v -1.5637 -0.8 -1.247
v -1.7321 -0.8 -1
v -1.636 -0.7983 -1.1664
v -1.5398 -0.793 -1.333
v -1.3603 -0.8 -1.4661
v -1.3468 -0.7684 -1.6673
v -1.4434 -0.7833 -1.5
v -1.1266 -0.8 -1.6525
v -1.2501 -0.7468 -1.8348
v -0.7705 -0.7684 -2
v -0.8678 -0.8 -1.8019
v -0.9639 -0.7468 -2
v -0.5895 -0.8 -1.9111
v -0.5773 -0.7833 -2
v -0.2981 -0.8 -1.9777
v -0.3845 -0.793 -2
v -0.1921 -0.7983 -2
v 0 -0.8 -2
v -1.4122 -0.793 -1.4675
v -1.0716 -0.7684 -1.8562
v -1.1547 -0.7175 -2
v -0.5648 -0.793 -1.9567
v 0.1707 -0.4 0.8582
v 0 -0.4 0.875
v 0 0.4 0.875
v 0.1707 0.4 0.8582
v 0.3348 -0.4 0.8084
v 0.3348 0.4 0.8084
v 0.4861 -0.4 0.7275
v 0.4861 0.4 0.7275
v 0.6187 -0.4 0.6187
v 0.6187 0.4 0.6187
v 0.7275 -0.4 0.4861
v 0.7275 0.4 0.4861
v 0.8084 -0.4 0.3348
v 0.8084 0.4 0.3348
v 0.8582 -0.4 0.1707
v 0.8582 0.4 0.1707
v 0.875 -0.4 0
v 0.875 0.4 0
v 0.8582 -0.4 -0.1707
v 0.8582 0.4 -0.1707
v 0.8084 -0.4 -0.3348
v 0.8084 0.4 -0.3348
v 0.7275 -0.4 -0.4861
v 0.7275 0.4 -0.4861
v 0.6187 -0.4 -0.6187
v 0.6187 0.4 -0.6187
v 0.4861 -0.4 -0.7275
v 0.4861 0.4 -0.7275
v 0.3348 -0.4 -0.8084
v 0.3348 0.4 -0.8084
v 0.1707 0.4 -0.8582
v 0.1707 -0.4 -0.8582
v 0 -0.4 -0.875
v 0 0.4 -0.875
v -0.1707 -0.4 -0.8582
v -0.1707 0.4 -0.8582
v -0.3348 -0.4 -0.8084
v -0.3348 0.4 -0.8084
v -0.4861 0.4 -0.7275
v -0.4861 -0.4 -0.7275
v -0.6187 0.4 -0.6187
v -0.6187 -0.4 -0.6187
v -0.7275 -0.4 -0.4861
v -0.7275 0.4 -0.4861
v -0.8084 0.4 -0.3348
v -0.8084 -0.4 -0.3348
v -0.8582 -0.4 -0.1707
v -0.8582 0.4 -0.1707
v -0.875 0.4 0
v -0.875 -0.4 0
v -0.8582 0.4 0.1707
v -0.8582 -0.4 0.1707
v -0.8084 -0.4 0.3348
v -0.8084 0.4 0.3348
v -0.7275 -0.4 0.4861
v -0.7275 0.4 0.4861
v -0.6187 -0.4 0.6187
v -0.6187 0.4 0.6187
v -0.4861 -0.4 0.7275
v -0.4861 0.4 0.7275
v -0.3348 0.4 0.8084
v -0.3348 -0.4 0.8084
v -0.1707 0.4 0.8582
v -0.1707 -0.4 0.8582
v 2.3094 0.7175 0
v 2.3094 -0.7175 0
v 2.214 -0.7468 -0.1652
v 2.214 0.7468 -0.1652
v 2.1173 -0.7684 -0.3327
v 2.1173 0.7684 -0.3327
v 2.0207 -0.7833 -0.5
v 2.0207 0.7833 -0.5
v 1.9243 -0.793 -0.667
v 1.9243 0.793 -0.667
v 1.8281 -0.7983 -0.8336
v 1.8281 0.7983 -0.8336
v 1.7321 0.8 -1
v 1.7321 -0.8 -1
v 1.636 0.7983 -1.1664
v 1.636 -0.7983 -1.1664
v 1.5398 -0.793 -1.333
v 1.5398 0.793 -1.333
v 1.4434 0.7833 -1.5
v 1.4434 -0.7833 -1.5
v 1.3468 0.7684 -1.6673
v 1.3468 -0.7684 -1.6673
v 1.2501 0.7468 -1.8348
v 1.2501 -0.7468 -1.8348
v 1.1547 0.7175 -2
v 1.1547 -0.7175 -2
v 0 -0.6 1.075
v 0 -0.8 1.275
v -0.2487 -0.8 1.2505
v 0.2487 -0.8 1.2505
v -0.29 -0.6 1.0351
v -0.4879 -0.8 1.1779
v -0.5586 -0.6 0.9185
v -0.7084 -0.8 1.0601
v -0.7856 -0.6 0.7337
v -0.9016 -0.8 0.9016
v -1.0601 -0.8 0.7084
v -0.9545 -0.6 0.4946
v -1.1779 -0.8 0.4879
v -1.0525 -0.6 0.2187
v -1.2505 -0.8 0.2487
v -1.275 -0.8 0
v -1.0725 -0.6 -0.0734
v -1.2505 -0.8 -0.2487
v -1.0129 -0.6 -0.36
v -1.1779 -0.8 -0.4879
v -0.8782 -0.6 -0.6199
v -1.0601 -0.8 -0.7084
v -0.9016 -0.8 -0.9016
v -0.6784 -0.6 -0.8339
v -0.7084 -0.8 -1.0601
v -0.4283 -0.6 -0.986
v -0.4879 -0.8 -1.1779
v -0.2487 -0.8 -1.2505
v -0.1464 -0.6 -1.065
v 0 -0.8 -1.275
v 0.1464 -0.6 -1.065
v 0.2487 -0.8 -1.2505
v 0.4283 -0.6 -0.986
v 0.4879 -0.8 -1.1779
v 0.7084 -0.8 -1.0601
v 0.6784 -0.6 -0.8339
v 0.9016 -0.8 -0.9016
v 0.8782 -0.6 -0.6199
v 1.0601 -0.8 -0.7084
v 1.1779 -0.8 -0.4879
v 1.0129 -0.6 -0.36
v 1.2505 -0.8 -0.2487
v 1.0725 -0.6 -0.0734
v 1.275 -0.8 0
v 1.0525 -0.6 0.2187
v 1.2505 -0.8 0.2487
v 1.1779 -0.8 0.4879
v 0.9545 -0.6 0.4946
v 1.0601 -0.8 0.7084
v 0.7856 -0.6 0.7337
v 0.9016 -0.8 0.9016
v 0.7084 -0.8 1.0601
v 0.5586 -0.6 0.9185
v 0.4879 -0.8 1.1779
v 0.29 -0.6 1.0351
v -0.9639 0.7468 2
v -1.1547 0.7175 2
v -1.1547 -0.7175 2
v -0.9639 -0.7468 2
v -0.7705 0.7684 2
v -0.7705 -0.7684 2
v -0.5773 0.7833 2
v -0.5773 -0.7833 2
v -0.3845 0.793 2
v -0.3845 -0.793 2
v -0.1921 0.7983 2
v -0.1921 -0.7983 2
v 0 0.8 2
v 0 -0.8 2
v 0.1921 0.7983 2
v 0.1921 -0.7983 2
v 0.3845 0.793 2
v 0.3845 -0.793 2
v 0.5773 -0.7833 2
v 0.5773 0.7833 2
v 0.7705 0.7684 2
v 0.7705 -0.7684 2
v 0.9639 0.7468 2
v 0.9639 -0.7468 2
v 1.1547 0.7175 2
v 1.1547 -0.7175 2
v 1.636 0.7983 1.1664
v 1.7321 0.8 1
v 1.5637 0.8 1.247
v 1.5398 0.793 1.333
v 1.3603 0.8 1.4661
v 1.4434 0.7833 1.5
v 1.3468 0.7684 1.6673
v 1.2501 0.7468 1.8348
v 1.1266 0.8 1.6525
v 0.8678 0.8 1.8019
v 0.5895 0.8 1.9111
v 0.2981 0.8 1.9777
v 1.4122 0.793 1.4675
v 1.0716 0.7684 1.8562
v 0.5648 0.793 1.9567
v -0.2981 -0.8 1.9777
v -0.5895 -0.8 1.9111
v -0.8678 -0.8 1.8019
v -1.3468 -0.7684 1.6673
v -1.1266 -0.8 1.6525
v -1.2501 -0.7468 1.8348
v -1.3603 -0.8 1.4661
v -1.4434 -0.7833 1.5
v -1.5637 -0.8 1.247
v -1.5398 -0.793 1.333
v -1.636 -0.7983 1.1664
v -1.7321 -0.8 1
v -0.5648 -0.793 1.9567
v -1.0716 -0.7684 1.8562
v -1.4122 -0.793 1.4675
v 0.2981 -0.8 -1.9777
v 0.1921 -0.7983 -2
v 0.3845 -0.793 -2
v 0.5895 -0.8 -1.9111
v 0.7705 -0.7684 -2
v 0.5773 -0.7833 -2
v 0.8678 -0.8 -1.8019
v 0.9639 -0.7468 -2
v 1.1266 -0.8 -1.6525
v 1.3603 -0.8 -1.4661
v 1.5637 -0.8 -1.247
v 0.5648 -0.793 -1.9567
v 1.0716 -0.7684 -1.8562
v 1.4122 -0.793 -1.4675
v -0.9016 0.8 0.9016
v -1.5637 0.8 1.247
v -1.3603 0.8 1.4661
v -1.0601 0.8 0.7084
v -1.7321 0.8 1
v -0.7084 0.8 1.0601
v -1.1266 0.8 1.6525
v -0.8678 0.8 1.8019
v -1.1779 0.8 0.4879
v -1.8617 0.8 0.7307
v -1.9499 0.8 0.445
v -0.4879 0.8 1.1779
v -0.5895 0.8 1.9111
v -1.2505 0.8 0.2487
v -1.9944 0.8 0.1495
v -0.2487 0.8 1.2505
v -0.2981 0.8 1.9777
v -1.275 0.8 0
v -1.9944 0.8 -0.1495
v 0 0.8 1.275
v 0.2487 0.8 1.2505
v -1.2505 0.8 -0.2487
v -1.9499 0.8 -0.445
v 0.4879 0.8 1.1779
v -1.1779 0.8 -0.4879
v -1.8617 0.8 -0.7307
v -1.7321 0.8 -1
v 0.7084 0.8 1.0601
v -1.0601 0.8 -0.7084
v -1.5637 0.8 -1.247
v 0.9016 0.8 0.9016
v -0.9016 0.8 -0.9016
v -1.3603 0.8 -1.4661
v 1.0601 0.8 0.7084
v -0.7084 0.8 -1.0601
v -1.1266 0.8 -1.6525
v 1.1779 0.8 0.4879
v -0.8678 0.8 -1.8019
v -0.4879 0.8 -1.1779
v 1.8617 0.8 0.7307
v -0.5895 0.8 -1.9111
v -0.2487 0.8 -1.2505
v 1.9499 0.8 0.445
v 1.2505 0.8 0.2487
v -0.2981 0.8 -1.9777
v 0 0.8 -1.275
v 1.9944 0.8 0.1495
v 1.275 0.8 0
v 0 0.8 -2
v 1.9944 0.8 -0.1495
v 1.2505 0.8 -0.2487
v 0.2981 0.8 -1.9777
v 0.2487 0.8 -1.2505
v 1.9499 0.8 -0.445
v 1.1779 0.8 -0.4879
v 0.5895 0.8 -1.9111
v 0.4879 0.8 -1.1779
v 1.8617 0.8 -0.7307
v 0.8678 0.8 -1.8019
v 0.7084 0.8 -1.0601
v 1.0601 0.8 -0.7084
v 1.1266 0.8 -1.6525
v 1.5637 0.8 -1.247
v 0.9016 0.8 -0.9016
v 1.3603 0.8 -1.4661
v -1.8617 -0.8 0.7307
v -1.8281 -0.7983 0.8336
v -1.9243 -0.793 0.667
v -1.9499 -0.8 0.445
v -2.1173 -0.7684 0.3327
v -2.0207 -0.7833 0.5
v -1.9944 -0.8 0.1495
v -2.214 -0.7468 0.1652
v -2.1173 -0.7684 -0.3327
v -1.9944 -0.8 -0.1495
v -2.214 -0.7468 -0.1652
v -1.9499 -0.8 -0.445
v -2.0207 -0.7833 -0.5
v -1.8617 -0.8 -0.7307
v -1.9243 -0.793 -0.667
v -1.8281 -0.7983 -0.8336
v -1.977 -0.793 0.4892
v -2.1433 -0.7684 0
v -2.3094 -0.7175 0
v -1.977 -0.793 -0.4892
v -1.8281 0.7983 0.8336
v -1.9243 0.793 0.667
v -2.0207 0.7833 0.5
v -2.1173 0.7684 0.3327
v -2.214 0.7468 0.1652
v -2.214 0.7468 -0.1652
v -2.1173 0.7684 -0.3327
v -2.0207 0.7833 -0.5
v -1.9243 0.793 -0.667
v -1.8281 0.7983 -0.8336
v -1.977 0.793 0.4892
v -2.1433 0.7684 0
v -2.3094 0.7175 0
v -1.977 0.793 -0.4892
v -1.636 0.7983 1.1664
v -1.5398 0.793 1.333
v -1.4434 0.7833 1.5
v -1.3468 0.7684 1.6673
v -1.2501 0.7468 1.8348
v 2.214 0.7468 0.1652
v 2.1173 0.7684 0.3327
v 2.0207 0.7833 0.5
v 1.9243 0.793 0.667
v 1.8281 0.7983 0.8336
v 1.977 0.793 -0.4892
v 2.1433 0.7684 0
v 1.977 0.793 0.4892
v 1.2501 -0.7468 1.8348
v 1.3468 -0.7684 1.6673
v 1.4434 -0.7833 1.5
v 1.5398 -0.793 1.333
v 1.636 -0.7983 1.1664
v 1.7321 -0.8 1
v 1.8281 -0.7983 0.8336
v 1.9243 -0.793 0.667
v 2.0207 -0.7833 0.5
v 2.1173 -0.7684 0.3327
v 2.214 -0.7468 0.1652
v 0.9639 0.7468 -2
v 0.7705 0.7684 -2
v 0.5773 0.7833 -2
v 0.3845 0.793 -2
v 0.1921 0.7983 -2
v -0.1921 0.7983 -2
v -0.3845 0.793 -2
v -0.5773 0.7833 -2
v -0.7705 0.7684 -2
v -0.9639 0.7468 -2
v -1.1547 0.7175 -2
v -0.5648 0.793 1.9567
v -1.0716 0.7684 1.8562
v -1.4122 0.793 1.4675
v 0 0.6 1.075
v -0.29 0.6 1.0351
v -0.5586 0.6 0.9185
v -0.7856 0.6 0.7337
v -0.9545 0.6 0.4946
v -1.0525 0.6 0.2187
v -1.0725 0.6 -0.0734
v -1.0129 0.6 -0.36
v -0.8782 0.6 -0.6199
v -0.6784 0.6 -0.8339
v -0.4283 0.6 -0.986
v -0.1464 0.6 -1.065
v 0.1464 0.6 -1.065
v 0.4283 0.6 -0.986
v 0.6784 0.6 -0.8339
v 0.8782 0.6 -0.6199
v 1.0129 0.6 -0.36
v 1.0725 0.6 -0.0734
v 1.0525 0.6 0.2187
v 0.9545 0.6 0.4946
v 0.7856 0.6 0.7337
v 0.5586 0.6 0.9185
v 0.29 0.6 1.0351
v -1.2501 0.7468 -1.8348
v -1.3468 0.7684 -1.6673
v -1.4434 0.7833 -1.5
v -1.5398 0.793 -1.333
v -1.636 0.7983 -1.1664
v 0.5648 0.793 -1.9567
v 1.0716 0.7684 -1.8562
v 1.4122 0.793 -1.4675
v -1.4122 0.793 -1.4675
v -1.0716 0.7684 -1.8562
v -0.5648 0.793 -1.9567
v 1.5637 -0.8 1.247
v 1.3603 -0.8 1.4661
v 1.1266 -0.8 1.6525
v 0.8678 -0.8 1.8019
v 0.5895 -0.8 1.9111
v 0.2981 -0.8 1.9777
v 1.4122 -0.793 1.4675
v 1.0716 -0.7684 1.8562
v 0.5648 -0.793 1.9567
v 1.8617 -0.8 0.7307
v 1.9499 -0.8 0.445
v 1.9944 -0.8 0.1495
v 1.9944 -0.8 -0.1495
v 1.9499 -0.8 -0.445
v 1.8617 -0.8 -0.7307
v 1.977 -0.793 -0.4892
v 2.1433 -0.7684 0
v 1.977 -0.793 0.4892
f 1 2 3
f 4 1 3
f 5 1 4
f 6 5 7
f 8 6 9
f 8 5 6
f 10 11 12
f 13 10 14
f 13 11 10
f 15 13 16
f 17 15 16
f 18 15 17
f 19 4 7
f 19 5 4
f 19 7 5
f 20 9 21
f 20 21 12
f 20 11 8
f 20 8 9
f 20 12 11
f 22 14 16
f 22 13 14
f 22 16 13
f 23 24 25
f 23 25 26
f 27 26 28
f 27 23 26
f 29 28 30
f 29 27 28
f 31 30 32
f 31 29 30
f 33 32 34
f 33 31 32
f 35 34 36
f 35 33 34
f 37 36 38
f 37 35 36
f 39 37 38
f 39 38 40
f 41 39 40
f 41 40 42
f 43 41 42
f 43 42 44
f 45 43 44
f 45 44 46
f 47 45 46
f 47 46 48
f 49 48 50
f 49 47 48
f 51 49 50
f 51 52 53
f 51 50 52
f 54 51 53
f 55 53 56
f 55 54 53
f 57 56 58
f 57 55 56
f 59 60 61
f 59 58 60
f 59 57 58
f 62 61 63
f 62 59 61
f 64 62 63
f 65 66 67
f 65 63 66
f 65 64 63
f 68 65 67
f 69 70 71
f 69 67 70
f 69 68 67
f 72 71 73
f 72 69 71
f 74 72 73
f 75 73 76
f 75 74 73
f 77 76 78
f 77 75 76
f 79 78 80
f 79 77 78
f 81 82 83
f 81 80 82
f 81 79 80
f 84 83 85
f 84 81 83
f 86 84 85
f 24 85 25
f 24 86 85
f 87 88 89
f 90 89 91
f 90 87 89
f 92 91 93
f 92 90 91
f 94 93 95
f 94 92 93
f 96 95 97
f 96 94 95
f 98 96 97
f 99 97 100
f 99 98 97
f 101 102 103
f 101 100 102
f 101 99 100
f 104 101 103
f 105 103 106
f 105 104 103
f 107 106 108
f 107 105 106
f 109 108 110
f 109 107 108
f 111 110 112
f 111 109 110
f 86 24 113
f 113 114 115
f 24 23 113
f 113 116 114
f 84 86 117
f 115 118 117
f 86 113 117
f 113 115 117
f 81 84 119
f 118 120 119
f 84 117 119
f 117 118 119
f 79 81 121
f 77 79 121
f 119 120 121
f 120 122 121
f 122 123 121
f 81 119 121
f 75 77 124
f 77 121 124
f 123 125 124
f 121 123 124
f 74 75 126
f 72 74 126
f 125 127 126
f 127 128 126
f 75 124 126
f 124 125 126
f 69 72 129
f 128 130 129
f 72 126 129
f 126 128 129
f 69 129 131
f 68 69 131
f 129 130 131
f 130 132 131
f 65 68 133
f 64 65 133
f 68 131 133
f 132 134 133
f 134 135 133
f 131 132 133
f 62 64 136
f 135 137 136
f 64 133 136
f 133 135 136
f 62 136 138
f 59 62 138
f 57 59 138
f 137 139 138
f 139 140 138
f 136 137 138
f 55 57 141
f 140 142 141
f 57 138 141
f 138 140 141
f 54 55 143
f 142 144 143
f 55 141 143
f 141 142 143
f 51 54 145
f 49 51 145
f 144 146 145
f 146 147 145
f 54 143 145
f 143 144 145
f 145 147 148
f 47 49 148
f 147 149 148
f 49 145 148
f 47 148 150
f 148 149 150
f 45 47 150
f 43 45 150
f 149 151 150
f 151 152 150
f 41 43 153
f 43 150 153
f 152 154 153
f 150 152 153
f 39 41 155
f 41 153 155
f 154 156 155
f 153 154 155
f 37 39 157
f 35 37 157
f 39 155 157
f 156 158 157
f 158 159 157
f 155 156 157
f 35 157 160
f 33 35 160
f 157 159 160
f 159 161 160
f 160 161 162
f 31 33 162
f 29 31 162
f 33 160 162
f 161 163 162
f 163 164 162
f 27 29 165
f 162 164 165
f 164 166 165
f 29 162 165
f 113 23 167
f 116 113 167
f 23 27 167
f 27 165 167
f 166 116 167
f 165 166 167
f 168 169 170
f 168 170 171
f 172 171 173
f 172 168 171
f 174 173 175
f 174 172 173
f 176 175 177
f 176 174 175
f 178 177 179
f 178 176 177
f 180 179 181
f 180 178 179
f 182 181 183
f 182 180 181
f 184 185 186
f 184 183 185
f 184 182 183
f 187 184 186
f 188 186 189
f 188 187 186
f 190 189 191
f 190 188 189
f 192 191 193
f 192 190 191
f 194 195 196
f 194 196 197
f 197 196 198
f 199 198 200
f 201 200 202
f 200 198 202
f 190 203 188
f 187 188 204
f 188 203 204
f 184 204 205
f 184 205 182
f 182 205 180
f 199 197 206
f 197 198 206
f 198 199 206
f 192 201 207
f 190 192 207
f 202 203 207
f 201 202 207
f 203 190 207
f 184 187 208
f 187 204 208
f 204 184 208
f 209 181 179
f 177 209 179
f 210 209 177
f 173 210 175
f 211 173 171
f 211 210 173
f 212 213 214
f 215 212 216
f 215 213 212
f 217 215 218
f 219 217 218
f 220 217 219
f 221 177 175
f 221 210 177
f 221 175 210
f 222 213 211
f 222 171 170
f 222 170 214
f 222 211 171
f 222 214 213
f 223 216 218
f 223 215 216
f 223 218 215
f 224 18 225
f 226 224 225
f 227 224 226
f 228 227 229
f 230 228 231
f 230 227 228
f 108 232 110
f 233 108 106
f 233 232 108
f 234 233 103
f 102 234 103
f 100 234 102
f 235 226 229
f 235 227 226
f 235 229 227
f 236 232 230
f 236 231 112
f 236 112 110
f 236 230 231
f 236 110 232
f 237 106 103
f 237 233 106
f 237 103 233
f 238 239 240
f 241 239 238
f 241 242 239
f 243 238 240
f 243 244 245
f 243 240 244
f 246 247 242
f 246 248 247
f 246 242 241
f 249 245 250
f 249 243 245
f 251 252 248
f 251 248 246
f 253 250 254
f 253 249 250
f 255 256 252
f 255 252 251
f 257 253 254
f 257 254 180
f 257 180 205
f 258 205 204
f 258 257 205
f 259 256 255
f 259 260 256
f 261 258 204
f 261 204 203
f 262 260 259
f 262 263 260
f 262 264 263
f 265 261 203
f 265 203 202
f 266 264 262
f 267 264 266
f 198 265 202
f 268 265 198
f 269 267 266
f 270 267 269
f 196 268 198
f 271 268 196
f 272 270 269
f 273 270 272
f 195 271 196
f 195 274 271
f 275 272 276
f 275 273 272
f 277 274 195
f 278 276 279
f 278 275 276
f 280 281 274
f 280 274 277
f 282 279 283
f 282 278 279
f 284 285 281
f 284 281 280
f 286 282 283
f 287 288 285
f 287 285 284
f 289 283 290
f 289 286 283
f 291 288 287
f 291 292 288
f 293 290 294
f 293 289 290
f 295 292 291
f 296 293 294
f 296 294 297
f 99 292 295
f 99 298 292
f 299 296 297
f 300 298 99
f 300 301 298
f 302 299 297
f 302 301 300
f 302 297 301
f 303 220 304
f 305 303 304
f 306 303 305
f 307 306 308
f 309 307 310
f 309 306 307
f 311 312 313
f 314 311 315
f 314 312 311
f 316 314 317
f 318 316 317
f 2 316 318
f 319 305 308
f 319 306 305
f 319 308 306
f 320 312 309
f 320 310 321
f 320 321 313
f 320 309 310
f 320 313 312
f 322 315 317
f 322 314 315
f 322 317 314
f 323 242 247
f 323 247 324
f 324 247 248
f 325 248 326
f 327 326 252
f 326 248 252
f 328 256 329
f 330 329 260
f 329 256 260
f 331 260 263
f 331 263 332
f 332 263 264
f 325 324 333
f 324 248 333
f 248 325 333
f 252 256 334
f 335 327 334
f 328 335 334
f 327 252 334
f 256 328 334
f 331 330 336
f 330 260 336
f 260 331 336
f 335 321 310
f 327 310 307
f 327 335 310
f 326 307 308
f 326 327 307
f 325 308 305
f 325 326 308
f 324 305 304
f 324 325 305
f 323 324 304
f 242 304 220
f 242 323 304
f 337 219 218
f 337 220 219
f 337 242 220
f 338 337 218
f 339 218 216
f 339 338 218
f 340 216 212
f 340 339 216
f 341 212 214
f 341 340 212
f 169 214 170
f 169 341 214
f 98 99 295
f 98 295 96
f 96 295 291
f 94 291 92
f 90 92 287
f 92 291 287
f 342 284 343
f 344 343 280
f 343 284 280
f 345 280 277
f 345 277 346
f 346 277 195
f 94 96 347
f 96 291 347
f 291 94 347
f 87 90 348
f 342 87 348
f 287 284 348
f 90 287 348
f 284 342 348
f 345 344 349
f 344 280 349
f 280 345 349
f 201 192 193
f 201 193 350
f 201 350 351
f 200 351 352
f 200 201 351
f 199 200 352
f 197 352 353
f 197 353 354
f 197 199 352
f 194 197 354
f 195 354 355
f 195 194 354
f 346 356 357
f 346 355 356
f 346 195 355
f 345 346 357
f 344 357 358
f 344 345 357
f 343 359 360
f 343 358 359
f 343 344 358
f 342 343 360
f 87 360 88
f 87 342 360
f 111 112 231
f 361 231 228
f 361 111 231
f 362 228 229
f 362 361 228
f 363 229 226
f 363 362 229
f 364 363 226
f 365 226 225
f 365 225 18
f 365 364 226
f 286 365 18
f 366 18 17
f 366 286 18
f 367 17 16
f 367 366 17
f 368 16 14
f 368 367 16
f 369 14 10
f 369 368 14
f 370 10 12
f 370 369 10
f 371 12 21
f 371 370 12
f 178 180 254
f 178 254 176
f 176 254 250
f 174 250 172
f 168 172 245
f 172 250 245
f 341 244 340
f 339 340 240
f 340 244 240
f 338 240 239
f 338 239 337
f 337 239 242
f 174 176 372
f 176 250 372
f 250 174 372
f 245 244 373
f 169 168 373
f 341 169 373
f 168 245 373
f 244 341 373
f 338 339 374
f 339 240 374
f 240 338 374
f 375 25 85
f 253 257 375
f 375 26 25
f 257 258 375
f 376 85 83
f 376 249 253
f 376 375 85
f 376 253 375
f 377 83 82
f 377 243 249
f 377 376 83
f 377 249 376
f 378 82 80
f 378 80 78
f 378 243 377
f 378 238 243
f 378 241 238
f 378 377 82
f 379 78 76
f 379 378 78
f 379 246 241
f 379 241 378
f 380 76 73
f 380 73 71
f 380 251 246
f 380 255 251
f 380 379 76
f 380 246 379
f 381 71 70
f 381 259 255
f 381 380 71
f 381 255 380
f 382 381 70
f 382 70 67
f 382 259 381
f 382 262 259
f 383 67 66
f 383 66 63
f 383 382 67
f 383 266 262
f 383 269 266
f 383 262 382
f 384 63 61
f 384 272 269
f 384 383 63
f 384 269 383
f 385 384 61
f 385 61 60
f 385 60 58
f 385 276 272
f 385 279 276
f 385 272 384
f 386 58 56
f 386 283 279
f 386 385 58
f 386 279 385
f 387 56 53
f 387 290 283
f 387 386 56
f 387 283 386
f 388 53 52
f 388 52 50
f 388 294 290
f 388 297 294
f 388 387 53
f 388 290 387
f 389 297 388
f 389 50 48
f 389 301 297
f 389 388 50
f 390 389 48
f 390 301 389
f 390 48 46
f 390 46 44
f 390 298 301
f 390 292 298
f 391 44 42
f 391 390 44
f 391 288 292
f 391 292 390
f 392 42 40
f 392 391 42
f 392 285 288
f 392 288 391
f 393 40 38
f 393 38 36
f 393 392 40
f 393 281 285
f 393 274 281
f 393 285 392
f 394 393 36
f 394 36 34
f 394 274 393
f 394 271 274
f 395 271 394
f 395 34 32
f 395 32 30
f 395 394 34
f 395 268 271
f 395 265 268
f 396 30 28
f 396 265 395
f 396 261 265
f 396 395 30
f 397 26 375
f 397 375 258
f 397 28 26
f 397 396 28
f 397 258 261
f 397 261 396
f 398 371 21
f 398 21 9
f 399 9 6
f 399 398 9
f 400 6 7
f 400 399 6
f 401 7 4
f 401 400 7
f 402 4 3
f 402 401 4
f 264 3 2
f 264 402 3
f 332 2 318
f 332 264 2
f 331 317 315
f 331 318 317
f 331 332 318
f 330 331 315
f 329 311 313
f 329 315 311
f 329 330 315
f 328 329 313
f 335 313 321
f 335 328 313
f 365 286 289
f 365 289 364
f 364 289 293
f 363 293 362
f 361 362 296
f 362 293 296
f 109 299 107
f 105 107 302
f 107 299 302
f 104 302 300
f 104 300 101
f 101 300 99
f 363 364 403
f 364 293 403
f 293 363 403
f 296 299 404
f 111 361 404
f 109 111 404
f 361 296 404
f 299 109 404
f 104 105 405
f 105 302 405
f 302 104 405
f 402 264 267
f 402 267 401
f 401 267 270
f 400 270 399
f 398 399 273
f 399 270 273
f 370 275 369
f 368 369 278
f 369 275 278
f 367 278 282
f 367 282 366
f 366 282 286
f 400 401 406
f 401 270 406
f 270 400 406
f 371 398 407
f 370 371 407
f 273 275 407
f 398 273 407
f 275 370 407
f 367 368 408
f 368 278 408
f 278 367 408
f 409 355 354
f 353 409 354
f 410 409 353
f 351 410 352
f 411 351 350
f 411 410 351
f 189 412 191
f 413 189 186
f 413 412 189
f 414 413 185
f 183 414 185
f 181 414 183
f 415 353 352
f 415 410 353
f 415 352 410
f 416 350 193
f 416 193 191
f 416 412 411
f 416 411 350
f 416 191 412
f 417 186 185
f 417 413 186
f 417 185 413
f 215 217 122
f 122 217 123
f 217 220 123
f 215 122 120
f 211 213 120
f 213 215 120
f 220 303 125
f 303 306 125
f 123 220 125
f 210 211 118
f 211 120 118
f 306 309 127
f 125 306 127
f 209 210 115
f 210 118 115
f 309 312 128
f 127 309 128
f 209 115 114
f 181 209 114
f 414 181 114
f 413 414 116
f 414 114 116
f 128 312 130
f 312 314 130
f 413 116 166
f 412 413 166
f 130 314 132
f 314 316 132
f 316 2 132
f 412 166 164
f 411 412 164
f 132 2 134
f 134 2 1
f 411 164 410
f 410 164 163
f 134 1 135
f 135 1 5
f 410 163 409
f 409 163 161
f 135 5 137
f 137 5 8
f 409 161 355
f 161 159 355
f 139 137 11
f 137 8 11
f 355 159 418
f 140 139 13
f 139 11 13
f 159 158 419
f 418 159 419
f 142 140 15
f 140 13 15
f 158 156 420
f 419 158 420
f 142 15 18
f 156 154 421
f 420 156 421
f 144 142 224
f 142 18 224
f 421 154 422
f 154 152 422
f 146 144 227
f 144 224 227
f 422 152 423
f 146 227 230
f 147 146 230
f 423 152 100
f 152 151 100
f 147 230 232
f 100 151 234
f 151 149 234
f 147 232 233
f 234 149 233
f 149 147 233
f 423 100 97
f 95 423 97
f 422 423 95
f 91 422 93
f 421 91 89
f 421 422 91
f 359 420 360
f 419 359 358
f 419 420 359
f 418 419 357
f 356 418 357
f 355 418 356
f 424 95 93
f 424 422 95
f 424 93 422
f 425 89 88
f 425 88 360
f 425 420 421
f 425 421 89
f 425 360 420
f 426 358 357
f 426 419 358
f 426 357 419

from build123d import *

# Parameters (mm, degrees)
SKETCH1_R           = 0.875
BOSS_EXTRUDE1_DEPTH = 0.8


with BuildPart() as part:
    # Sketch1 → Boss-Extrude1 (new, symmetric)
    with BuildSketch(Plane(origin=(0, 0, 0), x_dir=(1, 0, 0), z_dir=(0, 1, 0))):
        Polygon((2.309401077, 0), (1.154700538, 2), (-1.154700538, 2), (-2.309401077, 0), (-1.154700538, -2), (1.154700538, -2), align=None)
        with Locations(Location((0, 0, 0), (0, 0, 270))):
            Circle(SKETCH1_R, mode=Mode.SUBTRACT)
    extrude(amount=BOSS_EXTRUDE1_DEPTH, both=True)

    # Sketch2 → Cut-Revolve1 (revolve, cut)
    with BuildSketch(Plane(origin=(0, 0, 0), x_dir=(0, 0, -1), z_dir=(1, 0, 0))):
        with BuildLine():
            Line((-2, 0.8), (-3, 0.8))
            Line((-3, 0.8), (-3, 0.3))
            ThreePointArc((-3, 0.3), (-2.535648989, 0.621297978), (-2, 0.8))
        make_face()
        Polygon((-0.875, 0.8), (-0.875, 0.4), (-1.275, 0.8), align=None)
    cut_revolve1 = revolve(axis=Axis((0, 0.8, 0), (0, -1, 0)), mode=Mode.SUBTRACT)

    # Mirror1: Cut-Revolve1 across plane
    add(cut_revolve1.mirror(Plane.ZX), mode=Mode.SUBTRACT)


solid = part.part
